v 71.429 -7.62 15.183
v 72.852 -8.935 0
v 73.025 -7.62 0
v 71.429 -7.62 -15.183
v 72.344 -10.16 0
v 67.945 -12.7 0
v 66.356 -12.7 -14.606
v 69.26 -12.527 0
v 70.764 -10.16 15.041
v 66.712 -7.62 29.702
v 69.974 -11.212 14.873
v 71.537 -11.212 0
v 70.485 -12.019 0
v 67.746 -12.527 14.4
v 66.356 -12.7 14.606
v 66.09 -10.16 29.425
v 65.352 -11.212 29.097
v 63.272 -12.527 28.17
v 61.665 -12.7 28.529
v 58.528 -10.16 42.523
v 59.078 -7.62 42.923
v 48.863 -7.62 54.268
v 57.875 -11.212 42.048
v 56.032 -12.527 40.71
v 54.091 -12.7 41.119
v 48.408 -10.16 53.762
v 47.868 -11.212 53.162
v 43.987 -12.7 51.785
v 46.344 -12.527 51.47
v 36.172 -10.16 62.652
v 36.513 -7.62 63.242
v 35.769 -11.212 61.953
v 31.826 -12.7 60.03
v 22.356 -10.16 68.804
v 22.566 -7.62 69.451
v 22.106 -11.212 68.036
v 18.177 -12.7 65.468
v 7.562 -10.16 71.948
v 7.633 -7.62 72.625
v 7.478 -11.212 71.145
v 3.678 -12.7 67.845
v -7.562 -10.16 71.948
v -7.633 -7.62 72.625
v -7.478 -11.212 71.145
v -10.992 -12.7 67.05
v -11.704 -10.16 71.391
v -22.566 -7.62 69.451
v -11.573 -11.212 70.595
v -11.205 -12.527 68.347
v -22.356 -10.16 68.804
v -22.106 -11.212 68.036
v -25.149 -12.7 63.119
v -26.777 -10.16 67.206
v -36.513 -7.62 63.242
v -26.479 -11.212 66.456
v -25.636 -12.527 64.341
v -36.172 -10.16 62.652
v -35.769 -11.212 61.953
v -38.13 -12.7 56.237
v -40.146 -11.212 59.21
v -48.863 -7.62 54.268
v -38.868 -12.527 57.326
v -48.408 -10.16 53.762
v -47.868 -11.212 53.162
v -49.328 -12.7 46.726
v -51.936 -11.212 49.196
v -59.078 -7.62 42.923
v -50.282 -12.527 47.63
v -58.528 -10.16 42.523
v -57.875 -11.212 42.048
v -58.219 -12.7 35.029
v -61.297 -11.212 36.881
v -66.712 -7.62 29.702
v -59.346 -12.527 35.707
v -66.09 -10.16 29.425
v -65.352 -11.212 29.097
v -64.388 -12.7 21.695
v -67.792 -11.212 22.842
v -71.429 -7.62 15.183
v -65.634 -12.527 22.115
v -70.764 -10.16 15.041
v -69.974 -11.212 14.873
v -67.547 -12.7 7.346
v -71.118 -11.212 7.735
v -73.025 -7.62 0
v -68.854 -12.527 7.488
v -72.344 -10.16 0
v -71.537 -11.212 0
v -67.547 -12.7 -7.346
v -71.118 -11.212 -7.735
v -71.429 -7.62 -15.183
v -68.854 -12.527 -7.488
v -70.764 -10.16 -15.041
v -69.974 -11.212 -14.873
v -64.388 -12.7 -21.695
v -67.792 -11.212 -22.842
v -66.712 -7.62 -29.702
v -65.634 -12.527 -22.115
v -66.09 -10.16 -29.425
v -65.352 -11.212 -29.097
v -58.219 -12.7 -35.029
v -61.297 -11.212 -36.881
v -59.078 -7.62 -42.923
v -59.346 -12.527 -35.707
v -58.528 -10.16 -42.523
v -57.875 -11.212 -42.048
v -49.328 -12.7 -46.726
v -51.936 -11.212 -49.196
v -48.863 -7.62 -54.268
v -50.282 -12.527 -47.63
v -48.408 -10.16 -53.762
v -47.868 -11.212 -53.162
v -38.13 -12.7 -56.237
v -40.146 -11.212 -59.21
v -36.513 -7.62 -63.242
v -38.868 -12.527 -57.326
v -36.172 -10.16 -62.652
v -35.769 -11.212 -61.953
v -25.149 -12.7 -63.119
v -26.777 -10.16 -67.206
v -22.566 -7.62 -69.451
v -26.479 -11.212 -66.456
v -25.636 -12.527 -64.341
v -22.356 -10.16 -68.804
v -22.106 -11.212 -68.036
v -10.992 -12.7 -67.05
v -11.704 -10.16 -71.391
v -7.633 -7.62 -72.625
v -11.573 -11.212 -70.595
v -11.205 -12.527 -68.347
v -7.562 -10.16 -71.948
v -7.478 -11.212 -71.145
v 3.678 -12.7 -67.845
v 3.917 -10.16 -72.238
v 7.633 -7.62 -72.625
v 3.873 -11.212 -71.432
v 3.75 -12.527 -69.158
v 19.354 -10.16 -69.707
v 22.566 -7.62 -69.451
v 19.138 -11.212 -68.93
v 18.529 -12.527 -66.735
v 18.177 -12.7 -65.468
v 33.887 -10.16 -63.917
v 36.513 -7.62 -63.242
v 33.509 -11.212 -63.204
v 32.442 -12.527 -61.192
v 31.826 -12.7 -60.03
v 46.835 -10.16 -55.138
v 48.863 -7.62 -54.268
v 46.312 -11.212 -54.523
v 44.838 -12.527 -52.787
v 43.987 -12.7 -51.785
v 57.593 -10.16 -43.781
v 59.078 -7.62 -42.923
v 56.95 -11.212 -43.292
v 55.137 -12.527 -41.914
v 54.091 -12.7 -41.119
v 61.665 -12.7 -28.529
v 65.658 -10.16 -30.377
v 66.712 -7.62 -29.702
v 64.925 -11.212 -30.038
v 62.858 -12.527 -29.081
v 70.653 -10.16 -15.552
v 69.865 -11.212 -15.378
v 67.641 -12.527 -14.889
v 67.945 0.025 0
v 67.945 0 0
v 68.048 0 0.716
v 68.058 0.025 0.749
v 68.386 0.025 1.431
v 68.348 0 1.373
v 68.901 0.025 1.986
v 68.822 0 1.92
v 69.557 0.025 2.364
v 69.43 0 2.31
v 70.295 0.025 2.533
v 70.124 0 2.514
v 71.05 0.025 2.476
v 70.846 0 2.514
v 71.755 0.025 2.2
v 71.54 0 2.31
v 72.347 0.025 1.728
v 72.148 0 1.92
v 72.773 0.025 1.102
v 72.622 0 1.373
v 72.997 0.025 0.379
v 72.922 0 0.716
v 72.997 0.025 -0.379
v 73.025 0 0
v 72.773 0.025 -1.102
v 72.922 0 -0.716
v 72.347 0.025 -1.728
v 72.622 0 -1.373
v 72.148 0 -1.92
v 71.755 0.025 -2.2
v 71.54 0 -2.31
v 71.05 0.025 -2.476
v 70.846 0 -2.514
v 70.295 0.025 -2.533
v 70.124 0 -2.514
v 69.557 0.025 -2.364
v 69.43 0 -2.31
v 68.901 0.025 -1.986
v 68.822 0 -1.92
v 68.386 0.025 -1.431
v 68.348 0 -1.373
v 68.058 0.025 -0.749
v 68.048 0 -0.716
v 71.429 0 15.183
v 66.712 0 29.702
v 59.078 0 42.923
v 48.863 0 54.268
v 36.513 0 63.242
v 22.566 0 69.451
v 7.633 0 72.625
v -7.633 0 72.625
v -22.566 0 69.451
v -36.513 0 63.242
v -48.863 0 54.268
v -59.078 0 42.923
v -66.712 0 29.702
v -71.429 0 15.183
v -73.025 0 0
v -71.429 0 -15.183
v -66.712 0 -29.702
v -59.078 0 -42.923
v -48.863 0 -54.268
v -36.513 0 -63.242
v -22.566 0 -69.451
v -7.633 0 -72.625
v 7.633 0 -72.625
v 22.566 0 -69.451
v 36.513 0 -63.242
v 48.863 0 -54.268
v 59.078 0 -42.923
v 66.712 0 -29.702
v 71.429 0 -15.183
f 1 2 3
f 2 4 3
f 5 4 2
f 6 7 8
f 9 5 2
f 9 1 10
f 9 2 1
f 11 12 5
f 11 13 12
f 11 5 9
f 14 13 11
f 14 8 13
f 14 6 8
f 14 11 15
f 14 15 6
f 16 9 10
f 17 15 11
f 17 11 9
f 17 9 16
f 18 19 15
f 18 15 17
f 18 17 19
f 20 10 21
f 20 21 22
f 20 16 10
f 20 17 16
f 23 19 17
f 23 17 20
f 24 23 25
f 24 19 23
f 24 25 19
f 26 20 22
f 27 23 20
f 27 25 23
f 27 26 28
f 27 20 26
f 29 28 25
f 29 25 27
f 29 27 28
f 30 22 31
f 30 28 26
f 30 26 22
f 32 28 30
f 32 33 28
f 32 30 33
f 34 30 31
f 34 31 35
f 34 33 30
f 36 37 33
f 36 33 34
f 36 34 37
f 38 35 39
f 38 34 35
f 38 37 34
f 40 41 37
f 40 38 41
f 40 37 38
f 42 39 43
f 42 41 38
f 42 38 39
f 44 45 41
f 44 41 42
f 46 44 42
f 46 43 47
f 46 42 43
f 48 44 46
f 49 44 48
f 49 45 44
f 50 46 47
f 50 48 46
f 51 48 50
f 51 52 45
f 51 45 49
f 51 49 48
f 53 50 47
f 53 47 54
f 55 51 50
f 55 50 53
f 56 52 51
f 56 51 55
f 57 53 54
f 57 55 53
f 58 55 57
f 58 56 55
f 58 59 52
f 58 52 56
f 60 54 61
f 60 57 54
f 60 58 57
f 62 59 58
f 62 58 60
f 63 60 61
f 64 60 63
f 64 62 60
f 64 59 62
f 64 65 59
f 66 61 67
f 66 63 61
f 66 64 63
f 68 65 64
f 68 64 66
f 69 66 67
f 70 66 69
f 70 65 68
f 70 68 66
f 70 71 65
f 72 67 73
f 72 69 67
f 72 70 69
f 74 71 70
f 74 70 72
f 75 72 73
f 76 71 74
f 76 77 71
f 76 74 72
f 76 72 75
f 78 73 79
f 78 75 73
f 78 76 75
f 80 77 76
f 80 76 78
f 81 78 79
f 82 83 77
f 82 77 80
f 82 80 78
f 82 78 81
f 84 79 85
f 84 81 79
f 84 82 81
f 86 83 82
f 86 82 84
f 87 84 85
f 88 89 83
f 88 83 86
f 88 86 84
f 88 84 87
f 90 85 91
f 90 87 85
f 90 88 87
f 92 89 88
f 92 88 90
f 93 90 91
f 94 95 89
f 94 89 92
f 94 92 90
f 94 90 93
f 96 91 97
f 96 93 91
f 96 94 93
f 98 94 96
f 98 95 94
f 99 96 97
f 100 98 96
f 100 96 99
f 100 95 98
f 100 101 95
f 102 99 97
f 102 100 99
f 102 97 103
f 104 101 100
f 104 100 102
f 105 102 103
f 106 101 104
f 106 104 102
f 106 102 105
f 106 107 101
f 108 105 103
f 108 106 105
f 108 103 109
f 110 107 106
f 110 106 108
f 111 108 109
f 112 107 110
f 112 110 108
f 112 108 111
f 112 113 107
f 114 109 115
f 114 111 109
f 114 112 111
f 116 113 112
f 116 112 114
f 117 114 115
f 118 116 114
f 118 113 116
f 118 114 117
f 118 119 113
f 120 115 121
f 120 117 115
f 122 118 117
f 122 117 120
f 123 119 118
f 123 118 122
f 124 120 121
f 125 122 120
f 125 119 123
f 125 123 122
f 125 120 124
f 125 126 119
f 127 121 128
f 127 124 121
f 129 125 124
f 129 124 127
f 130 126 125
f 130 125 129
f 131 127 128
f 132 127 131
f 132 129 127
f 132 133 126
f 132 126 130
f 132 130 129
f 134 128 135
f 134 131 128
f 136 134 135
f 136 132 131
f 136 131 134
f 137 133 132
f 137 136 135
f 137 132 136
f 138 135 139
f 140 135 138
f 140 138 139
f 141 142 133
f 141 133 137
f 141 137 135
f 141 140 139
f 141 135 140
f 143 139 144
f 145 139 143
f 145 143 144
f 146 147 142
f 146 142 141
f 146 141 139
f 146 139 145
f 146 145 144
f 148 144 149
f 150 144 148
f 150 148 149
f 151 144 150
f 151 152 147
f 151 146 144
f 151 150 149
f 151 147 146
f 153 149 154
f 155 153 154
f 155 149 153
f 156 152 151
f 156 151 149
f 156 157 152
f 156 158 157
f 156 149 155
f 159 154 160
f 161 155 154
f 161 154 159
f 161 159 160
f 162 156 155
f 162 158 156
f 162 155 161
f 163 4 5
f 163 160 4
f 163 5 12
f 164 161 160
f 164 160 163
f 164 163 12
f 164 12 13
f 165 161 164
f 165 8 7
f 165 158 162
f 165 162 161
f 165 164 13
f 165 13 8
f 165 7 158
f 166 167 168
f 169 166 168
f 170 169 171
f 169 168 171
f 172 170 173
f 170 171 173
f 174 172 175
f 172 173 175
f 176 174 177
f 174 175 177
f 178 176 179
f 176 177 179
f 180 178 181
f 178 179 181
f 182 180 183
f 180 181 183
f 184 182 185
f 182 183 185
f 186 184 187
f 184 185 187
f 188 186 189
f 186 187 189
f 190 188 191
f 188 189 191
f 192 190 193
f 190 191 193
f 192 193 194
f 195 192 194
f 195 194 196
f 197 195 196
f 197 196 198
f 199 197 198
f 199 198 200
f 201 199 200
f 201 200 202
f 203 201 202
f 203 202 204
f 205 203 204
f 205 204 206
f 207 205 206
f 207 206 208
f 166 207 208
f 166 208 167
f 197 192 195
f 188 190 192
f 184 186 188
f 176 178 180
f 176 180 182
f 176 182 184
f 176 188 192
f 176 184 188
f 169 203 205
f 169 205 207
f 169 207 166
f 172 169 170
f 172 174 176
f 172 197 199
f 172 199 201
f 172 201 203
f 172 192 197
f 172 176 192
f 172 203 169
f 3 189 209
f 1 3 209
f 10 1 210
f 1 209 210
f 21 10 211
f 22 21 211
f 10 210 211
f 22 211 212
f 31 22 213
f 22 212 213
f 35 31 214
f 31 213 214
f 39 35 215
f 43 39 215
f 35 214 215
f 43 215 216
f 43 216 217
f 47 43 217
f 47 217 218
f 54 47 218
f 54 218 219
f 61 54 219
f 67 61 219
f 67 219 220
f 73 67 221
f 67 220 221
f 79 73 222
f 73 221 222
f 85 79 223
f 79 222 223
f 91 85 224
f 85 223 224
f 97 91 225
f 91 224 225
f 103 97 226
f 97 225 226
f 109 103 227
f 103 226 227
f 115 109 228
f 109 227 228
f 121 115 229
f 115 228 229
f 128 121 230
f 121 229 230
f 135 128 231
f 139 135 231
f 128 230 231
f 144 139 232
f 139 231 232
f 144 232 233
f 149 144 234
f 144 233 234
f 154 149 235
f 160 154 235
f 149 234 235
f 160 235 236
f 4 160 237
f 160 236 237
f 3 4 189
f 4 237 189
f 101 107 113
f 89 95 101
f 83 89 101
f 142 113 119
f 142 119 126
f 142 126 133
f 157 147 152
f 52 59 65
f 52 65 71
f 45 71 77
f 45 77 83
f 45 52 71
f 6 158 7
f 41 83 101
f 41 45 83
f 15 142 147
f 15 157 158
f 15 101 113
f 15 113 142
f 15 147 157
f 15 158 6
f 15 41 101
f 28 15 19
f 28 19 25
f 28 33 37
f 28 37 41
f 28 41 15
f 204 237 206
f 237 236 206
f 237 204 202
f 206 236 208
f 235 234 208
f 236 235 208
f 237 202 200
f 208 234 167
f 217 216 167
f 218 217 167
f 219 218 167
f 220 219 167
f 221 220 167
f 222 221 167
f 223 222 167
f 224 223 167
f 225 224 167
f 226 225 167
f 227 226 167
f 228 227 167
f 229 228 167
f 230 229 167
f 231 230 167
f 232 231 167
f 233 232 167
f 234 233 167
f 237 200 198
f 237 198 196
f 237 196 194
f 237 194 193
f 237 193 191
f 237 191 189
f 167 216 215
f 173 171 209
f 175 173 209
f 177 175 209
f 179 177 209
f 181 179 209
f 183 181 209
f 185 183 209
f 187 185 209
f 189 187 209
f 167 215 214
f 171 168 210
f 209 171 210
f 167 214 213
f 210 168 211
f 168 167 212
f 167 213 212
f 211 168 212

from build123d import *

# Parameters (mm, degrees)
F0_R     = 73.025
F1_DEPTH = 12.7
F2_R     = 5.08
F4_DEPTH = 0.0254


with BuildPart() as f1:
    # F0 (on Front) → F1 (new body)
    with BuildSketch(Plane.XZ):
        Circle(F0_R)
    extrude(amount=F1_DEPTH)

    # F2
    f2_edges = [f1.edges().sort_by_distance(p)[0] for p in [
        (-73.025, -12.7, 0),
    ]]
    fillet(f2_edges, radius=F2_R)

    # F3 (on face) → F4 (join)
    with BuildSketch(Plane(origin=(0, 0, 0), x_dir=(-1, 0, 0), z_dir=(0, 1, 0))):
        with BuildLine():
            ThreePointArc((-73.025, 0), (-70.485, -2.54), (-67.945, 0))
            ThreePointArc((-67.945, 0), (-70.485, 2.54), (-73.025, 0))
        make_face()
    extrude(amount=F4_DEPTH)


solid = f1.part
